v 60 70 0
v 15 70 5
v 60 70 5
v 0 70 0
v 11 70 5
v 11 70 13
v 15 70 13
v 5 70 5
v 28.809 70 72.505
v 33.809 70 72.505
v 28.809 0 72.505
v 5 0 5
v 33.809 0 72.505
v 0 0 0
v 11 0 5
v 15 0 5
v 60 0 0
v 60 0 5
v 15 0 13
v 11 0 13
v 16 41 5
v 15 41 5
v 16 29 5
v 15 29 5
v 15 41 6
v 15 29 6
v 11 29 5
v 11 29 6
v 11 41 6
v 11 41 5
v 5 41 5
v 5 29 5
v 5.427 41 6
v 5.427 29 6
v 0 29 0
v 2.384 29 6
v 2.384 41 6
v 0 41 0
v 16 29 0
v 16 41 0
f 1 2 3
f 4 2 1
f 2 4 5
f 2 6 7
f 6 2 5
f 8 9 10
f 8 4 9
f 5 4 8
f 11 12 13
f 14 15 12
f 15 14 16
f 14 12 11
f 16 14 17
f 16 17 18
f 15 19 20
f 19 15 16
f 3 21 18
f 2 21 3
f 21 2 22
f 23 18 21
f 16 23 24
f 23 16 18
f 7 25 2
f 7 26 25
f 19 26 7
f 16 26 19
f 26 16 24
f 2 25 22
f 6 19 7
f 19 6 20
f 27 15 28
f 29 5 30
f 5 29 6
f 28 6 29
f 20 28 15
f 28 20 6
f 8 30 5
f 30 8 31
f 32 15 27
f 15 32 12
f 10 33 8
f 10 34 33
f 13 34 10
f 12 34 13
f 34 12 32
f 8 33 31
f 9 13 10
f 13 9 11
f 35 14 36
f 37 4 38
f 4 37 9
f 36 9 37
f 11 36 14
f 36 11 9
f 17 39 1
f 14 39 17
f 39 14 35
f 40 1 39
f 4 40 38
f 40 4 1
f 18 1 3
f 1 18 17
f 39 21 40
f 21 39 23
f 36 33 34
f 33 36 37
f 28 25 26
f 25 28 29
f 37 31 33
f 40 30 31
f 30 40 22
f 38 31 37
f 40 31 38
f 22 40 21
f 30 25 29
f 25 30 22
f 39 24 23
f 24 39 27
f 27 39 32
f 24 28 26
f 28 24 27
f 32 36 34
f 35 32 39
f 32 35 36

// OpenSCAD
// Purpose: phone stand – tilted backrest via rotate, lip, cable slot; profile via polygon.
angle = 65; depth = 60; width = 70; t = 5;
lean = 80;
module profile() polygon([
    [0, 0], [depth, 0], [depth, t], [t + 10, t], [t + 10, t + 8], [t + 6, t + 8], [t + 6, t],
    [t, t], [t + lean * cos(angle) - t, lean * sin(angle)], [lean * cos(angle) - t, lean * sin(angle)]
]);
difference() {
    rotate([90, 0, 0]) translate([0, 0, -width]) linear_extrude(height = width) profile();
    // Cable slot
    translate([-1, width / 2 - 6, -1]) cube([t + 12, 12, t + 2]);
}
